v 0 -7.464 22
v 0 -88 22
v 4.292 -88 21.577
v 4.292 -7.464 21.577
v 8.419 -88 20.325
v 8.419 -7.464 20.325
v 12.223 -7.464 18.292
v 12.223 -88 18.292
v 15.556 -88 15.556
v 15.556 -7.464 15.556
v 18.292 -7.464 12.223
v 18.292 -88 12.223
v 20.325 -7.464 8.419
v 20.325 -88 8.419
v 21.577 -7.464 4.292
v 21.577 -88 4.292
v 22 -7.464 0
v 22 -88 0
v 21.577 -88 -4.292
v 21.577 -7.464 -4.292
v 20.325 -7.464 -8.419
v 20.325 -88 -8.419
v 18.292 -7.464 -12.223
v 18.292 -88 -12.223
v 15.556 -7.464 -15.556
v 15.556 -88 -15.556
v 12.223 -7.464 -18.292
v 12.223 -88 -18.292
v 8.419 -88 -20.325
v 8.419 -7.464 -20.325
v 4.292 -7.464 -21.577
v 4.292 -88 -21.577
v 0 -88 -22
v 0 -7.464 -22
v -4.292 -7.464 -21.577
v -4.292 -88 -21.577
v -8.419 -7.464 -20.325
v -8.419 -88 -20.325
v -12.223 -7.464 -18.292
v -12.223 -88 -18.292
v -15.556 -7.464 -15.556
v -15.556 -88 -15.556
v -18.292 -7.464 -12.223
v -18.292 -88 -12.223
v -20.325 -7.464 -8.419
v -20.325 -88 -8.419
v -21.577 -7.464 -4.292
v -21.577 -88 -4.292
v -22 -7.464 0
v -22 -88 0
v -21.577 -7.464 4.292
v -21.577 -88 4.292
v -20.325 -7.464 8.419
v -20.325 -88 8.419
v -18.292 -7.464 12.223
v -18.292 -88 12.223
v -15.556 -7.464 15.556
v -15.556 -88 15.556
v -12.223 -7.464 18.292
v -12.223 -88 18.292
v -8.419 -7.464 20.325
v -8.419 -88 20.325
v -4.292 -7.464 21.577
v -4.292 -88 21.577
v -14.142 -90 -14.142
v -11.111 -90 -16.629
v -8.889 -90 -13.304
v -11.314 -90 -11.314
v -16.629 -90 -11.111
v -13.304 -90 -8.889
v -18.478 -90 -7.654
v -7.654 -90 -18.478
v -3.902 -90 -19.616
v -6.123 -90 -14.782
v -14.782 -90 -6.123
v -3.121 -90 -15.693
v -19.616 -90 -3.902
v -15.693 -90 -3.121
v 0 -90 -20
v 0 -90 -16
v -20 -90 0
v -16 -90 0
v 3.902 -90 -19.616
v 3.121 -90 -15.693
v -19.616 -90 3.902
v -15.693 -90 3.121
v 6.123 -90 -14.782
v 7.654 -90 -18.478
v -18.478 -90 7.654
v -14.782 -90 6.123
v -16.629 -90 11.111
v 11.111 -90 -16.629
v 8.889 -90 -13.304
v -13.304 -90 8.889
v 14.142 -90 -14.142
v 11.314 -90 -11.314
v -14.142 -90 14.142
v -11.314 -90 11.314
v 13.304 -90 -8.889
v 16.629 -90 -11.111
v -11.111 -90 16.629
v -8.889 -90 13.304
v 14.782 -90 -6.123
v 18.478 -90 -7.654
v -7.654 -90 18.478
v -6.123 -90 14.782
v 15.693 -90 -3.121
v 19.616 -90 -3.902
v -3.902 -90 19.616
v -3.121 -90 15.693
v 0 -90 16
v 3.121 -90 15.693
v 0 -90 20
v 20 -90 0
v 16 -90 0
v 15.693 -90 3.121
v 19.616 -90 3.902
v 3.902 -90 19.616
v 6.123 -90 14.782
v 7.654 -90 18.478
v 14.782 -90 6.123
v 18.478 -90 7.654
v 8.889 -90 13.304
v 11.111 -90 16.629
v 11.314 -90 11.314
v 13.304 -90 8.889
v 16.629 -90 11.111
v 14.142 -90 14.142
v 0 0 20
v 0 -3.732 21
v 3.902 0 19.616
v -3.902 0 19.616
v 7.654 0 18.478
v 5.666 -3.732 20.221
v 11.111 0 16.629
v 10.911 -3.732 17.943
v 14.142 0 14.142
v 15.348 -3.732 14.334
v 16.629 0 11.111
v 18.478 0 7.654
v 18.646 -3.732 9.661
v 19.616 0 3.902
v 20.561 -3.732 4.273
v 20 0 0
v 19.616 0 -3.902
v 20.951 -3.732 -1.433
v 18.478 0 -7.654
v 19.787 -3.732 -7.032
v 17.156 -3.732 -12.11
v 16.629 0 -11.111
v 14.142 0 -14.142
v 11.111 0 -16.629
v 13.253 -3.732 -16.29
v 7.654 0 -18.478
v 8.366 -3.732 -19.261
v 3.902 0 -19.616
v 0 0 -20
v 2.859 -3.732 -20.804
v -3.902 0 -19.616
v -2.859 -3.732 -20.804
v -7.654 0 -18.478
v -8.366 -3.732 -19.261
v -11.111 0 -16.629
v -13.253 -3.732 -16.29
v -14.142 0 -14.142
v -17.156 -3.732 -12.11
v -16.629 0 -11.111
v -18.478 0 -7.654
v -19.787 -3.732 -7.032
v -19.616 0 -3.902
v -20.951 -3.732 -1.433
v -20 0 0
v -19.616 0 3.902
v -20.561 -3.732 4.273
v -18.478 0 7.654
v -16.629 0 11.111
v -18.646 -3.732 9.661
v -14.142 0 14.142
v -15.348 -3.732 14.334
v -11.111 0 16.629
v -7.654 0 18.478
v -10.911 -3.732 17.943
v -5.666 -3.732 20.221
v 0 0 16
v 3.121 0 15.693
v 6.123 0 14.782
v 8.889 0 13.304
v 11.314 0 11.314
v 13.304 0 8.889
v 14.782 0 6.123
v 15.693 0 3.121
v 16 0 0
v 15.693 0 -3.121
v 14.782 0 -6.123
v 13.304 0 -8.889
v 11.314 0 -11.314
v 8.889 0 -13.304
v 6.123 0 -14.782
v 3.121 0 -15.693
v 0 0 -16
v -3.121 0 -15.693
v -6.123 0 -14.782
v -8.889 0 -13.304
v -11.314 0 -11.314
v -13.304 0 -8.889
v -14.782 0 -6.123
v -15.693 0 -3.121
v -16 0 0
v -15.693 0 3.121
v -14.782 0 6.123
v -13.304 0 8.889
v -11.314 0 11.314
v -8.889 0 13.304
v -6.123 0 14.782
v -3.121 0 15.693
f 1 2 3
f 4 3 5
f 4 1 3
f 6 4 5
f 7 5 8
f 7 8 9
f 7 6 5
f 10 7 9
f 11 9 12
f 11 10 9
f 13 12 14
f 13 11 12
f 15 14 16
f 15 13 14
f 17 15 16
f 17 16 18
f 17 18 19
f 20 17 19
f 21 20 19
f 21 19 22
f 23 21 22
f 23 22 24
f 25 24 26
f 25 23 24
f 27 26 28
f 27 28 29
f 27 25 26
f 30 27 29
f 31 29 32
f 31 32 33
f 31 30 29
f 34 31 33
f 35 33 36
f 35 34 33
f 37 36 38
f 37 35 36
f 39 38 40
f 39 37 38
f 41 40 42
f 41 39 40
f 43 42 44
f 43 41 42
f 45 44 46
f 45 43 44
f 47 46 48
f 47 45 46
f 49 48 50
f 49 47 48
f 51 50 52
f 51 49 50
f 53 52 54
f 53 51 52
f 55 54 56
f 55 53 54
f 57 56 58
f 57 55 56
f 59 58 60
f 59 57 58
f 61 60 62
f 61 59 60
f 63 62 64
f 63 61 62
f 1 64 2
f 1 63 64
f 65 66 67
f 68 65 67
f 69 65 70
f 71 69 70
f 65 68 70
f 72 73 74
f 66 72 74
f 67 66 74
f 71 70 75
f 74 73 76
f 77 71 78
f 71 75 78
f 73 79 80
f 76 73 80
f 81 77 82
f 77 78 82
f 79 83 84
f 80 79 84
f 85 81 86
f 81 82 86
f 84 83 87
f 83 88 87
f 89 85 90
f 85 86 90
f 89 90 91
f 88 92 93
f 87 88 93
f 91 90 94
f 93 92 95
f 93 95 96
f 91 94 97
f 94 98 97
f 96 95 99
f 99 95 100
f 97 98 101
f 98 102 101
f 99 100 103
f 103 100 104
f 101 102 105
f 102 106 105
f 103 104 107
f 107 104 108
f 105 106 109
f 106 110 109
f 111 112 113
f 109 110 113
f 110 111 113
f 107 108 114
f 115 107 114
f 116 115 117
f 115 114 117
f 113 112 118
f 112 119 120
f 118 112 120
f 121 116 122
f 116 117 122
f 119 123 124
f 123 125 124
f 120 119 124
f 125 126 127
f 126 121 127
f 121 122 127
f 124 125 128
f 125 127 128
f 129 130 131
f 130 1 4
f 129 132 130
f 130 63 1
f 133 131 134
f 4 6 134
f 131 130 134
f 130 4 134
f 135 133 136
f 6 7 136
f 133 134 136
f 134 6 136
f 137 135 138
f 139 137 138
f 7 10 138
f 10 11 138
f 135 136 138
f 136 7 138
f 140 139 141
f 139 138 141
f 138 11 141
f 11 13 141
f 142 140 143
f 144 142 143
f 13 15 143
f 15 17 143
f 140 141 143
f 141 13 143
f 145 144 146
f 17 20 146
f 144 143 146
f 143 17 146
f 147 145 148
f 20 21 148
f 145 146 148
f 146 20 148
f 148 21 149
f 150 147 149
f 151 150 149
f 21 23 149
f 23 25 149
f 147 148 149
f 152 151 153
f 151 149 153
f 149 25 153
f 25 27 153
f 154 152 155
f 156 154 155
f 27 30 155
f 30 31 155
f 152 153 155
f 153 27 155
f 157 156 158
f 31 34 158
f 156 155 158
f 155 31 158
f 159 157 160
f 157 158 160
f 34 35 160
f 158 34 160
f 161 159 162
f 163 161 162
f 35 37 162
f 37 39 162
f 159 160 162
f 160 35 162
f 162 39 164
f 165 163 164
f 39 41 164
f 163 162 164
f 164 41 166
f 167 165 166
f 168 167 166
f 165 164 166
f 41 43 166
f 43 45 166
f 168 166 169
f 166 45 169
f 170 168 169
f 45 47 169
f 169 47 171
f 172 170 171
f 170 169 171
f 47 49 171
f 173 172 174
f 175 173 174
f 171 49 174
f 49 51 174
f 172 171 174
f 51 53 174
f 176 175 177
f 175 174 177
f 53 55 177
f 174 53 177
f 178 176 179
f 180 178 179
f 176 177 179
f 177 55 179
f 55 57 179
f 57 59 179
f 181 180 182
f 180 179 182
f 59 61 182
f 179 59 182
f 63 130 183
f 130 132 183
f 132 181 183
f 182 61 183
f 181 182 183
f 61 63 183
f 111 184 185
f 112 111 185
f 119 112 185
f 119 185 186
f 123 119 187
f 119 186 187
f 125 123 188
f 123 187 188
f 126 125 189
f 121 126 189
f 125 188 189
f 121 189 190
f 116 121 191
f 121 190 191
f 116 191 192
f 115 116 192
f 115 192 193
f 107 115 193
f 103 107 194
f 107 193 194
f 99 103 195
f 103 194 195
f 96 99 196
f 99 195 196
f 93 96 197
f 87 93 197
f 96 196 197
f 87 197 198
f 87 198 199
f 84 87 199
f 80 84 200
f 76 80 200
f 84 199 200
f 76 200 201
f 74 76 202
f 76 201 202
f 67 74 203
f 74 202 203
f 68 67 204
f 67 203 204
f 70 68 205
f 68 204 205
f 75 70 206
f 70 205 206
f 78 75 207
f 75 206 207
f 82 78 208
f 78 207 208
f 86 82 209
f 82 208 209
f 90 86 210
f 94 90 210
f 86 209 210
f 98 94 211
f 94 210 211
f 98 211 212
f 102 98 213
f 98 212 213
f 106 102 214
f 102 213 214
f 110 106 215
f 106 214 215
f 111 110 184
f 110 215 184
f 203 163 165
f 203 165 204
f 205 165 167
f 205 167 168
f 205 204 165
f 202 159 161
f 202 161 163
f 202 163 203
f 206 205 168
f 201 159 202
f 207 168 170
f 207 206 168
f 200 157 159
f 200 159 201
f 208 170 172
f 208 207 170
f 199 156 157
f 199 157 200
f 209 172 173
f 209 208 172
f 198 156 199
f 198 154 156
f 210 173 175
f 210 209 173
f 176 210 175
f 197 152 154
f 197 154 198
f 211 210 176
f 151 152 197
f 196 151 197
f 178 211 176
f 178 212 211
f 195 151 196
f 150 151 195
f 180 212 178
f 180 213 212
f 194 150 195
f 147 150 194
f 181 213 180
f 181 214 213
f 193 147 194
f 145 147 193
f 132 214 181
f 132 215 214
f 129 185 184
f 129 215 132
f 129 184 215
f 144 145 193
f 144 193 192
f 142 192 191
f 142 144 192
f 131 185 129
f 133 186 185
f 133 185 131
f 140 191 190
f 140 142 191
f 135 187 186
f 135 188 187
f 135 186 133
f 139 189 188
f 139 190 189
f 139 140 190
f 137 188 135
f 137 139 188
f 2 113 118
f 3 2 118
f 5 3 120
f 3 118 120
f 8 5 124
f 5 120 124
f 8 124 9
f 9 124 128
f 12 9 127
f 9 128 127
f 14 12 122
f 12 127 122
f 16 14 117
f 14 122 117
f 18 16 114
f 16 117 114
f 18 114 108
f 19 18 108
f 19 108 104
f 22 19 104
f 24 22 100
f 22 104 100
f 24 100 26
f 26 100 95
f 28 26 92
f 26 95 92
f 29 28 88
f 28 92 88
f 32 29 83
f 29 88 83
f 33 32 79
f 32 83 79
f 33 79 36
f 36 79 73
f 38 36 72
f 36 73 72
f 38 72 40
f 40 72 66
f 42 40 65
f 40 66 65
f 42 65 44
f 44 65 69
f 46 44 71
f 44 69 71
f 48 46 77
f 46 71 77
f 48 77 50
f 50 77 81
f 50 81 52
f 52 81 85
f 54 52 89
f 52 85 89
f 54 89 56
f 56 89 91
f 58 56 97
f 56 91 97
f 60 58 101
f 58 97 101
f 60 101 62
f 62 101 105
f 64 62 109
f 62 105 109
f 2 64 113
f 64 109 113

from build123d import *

# Parameters (mm, degrees)
SKETCH1_R           = 22
SKETCH1_R_2         = 16
BOSS_EXTRUDE1_DEPTH = 90
CHAMFER1_SIZE       = 2
CHAMFER1_SIZE2      = 7.464101615
CHAMFER2_SIZE       = 2


with BuildPart() as part:
    # Sketch1 → Boss-Extrude1 (new body)
    with BuildSketch(Plane(origin=(0, 0, 0), x_dir=(1, 0, 0), z_dir=(0, 1, 0))):
        with Locations(Location((0, 0, 0), (0, 0, 270))):
            Circle(SKETCH1_R)
        with Locations(Location((0, 0, 0), (0, 0, 270))):
            Circle(SKETCH1_R_2, mode=Mode.SUBTRACT)
    extrude(amount=-BOSS_EXTRUDE1_DEPTH)

    # Chamfer1
    chamfer1_edges = [part.edges().sort_by_distance(p)[0] for p in [
        (0, 0, -22),
    ]]
    chamfer1_side = [part.faces().sort_by_distance(p)[0] for p in [
        (0, 0, -21.377746033),
    ]]
    chamfer(chamfer1_edges, length=CHAMFER1_SIZE, length2=CHAMFER1_SIZE2, reference=chamfer1_side[0])

    # Chamfer2
    chamfer2_edges = [part.edges().sort_by_distance(p)[0] for p in [
        (0, -90, -22),
    ]]
    chamfer(chamfer2_edges, length=CHAMFER2_SIZE)


solid = part.part
